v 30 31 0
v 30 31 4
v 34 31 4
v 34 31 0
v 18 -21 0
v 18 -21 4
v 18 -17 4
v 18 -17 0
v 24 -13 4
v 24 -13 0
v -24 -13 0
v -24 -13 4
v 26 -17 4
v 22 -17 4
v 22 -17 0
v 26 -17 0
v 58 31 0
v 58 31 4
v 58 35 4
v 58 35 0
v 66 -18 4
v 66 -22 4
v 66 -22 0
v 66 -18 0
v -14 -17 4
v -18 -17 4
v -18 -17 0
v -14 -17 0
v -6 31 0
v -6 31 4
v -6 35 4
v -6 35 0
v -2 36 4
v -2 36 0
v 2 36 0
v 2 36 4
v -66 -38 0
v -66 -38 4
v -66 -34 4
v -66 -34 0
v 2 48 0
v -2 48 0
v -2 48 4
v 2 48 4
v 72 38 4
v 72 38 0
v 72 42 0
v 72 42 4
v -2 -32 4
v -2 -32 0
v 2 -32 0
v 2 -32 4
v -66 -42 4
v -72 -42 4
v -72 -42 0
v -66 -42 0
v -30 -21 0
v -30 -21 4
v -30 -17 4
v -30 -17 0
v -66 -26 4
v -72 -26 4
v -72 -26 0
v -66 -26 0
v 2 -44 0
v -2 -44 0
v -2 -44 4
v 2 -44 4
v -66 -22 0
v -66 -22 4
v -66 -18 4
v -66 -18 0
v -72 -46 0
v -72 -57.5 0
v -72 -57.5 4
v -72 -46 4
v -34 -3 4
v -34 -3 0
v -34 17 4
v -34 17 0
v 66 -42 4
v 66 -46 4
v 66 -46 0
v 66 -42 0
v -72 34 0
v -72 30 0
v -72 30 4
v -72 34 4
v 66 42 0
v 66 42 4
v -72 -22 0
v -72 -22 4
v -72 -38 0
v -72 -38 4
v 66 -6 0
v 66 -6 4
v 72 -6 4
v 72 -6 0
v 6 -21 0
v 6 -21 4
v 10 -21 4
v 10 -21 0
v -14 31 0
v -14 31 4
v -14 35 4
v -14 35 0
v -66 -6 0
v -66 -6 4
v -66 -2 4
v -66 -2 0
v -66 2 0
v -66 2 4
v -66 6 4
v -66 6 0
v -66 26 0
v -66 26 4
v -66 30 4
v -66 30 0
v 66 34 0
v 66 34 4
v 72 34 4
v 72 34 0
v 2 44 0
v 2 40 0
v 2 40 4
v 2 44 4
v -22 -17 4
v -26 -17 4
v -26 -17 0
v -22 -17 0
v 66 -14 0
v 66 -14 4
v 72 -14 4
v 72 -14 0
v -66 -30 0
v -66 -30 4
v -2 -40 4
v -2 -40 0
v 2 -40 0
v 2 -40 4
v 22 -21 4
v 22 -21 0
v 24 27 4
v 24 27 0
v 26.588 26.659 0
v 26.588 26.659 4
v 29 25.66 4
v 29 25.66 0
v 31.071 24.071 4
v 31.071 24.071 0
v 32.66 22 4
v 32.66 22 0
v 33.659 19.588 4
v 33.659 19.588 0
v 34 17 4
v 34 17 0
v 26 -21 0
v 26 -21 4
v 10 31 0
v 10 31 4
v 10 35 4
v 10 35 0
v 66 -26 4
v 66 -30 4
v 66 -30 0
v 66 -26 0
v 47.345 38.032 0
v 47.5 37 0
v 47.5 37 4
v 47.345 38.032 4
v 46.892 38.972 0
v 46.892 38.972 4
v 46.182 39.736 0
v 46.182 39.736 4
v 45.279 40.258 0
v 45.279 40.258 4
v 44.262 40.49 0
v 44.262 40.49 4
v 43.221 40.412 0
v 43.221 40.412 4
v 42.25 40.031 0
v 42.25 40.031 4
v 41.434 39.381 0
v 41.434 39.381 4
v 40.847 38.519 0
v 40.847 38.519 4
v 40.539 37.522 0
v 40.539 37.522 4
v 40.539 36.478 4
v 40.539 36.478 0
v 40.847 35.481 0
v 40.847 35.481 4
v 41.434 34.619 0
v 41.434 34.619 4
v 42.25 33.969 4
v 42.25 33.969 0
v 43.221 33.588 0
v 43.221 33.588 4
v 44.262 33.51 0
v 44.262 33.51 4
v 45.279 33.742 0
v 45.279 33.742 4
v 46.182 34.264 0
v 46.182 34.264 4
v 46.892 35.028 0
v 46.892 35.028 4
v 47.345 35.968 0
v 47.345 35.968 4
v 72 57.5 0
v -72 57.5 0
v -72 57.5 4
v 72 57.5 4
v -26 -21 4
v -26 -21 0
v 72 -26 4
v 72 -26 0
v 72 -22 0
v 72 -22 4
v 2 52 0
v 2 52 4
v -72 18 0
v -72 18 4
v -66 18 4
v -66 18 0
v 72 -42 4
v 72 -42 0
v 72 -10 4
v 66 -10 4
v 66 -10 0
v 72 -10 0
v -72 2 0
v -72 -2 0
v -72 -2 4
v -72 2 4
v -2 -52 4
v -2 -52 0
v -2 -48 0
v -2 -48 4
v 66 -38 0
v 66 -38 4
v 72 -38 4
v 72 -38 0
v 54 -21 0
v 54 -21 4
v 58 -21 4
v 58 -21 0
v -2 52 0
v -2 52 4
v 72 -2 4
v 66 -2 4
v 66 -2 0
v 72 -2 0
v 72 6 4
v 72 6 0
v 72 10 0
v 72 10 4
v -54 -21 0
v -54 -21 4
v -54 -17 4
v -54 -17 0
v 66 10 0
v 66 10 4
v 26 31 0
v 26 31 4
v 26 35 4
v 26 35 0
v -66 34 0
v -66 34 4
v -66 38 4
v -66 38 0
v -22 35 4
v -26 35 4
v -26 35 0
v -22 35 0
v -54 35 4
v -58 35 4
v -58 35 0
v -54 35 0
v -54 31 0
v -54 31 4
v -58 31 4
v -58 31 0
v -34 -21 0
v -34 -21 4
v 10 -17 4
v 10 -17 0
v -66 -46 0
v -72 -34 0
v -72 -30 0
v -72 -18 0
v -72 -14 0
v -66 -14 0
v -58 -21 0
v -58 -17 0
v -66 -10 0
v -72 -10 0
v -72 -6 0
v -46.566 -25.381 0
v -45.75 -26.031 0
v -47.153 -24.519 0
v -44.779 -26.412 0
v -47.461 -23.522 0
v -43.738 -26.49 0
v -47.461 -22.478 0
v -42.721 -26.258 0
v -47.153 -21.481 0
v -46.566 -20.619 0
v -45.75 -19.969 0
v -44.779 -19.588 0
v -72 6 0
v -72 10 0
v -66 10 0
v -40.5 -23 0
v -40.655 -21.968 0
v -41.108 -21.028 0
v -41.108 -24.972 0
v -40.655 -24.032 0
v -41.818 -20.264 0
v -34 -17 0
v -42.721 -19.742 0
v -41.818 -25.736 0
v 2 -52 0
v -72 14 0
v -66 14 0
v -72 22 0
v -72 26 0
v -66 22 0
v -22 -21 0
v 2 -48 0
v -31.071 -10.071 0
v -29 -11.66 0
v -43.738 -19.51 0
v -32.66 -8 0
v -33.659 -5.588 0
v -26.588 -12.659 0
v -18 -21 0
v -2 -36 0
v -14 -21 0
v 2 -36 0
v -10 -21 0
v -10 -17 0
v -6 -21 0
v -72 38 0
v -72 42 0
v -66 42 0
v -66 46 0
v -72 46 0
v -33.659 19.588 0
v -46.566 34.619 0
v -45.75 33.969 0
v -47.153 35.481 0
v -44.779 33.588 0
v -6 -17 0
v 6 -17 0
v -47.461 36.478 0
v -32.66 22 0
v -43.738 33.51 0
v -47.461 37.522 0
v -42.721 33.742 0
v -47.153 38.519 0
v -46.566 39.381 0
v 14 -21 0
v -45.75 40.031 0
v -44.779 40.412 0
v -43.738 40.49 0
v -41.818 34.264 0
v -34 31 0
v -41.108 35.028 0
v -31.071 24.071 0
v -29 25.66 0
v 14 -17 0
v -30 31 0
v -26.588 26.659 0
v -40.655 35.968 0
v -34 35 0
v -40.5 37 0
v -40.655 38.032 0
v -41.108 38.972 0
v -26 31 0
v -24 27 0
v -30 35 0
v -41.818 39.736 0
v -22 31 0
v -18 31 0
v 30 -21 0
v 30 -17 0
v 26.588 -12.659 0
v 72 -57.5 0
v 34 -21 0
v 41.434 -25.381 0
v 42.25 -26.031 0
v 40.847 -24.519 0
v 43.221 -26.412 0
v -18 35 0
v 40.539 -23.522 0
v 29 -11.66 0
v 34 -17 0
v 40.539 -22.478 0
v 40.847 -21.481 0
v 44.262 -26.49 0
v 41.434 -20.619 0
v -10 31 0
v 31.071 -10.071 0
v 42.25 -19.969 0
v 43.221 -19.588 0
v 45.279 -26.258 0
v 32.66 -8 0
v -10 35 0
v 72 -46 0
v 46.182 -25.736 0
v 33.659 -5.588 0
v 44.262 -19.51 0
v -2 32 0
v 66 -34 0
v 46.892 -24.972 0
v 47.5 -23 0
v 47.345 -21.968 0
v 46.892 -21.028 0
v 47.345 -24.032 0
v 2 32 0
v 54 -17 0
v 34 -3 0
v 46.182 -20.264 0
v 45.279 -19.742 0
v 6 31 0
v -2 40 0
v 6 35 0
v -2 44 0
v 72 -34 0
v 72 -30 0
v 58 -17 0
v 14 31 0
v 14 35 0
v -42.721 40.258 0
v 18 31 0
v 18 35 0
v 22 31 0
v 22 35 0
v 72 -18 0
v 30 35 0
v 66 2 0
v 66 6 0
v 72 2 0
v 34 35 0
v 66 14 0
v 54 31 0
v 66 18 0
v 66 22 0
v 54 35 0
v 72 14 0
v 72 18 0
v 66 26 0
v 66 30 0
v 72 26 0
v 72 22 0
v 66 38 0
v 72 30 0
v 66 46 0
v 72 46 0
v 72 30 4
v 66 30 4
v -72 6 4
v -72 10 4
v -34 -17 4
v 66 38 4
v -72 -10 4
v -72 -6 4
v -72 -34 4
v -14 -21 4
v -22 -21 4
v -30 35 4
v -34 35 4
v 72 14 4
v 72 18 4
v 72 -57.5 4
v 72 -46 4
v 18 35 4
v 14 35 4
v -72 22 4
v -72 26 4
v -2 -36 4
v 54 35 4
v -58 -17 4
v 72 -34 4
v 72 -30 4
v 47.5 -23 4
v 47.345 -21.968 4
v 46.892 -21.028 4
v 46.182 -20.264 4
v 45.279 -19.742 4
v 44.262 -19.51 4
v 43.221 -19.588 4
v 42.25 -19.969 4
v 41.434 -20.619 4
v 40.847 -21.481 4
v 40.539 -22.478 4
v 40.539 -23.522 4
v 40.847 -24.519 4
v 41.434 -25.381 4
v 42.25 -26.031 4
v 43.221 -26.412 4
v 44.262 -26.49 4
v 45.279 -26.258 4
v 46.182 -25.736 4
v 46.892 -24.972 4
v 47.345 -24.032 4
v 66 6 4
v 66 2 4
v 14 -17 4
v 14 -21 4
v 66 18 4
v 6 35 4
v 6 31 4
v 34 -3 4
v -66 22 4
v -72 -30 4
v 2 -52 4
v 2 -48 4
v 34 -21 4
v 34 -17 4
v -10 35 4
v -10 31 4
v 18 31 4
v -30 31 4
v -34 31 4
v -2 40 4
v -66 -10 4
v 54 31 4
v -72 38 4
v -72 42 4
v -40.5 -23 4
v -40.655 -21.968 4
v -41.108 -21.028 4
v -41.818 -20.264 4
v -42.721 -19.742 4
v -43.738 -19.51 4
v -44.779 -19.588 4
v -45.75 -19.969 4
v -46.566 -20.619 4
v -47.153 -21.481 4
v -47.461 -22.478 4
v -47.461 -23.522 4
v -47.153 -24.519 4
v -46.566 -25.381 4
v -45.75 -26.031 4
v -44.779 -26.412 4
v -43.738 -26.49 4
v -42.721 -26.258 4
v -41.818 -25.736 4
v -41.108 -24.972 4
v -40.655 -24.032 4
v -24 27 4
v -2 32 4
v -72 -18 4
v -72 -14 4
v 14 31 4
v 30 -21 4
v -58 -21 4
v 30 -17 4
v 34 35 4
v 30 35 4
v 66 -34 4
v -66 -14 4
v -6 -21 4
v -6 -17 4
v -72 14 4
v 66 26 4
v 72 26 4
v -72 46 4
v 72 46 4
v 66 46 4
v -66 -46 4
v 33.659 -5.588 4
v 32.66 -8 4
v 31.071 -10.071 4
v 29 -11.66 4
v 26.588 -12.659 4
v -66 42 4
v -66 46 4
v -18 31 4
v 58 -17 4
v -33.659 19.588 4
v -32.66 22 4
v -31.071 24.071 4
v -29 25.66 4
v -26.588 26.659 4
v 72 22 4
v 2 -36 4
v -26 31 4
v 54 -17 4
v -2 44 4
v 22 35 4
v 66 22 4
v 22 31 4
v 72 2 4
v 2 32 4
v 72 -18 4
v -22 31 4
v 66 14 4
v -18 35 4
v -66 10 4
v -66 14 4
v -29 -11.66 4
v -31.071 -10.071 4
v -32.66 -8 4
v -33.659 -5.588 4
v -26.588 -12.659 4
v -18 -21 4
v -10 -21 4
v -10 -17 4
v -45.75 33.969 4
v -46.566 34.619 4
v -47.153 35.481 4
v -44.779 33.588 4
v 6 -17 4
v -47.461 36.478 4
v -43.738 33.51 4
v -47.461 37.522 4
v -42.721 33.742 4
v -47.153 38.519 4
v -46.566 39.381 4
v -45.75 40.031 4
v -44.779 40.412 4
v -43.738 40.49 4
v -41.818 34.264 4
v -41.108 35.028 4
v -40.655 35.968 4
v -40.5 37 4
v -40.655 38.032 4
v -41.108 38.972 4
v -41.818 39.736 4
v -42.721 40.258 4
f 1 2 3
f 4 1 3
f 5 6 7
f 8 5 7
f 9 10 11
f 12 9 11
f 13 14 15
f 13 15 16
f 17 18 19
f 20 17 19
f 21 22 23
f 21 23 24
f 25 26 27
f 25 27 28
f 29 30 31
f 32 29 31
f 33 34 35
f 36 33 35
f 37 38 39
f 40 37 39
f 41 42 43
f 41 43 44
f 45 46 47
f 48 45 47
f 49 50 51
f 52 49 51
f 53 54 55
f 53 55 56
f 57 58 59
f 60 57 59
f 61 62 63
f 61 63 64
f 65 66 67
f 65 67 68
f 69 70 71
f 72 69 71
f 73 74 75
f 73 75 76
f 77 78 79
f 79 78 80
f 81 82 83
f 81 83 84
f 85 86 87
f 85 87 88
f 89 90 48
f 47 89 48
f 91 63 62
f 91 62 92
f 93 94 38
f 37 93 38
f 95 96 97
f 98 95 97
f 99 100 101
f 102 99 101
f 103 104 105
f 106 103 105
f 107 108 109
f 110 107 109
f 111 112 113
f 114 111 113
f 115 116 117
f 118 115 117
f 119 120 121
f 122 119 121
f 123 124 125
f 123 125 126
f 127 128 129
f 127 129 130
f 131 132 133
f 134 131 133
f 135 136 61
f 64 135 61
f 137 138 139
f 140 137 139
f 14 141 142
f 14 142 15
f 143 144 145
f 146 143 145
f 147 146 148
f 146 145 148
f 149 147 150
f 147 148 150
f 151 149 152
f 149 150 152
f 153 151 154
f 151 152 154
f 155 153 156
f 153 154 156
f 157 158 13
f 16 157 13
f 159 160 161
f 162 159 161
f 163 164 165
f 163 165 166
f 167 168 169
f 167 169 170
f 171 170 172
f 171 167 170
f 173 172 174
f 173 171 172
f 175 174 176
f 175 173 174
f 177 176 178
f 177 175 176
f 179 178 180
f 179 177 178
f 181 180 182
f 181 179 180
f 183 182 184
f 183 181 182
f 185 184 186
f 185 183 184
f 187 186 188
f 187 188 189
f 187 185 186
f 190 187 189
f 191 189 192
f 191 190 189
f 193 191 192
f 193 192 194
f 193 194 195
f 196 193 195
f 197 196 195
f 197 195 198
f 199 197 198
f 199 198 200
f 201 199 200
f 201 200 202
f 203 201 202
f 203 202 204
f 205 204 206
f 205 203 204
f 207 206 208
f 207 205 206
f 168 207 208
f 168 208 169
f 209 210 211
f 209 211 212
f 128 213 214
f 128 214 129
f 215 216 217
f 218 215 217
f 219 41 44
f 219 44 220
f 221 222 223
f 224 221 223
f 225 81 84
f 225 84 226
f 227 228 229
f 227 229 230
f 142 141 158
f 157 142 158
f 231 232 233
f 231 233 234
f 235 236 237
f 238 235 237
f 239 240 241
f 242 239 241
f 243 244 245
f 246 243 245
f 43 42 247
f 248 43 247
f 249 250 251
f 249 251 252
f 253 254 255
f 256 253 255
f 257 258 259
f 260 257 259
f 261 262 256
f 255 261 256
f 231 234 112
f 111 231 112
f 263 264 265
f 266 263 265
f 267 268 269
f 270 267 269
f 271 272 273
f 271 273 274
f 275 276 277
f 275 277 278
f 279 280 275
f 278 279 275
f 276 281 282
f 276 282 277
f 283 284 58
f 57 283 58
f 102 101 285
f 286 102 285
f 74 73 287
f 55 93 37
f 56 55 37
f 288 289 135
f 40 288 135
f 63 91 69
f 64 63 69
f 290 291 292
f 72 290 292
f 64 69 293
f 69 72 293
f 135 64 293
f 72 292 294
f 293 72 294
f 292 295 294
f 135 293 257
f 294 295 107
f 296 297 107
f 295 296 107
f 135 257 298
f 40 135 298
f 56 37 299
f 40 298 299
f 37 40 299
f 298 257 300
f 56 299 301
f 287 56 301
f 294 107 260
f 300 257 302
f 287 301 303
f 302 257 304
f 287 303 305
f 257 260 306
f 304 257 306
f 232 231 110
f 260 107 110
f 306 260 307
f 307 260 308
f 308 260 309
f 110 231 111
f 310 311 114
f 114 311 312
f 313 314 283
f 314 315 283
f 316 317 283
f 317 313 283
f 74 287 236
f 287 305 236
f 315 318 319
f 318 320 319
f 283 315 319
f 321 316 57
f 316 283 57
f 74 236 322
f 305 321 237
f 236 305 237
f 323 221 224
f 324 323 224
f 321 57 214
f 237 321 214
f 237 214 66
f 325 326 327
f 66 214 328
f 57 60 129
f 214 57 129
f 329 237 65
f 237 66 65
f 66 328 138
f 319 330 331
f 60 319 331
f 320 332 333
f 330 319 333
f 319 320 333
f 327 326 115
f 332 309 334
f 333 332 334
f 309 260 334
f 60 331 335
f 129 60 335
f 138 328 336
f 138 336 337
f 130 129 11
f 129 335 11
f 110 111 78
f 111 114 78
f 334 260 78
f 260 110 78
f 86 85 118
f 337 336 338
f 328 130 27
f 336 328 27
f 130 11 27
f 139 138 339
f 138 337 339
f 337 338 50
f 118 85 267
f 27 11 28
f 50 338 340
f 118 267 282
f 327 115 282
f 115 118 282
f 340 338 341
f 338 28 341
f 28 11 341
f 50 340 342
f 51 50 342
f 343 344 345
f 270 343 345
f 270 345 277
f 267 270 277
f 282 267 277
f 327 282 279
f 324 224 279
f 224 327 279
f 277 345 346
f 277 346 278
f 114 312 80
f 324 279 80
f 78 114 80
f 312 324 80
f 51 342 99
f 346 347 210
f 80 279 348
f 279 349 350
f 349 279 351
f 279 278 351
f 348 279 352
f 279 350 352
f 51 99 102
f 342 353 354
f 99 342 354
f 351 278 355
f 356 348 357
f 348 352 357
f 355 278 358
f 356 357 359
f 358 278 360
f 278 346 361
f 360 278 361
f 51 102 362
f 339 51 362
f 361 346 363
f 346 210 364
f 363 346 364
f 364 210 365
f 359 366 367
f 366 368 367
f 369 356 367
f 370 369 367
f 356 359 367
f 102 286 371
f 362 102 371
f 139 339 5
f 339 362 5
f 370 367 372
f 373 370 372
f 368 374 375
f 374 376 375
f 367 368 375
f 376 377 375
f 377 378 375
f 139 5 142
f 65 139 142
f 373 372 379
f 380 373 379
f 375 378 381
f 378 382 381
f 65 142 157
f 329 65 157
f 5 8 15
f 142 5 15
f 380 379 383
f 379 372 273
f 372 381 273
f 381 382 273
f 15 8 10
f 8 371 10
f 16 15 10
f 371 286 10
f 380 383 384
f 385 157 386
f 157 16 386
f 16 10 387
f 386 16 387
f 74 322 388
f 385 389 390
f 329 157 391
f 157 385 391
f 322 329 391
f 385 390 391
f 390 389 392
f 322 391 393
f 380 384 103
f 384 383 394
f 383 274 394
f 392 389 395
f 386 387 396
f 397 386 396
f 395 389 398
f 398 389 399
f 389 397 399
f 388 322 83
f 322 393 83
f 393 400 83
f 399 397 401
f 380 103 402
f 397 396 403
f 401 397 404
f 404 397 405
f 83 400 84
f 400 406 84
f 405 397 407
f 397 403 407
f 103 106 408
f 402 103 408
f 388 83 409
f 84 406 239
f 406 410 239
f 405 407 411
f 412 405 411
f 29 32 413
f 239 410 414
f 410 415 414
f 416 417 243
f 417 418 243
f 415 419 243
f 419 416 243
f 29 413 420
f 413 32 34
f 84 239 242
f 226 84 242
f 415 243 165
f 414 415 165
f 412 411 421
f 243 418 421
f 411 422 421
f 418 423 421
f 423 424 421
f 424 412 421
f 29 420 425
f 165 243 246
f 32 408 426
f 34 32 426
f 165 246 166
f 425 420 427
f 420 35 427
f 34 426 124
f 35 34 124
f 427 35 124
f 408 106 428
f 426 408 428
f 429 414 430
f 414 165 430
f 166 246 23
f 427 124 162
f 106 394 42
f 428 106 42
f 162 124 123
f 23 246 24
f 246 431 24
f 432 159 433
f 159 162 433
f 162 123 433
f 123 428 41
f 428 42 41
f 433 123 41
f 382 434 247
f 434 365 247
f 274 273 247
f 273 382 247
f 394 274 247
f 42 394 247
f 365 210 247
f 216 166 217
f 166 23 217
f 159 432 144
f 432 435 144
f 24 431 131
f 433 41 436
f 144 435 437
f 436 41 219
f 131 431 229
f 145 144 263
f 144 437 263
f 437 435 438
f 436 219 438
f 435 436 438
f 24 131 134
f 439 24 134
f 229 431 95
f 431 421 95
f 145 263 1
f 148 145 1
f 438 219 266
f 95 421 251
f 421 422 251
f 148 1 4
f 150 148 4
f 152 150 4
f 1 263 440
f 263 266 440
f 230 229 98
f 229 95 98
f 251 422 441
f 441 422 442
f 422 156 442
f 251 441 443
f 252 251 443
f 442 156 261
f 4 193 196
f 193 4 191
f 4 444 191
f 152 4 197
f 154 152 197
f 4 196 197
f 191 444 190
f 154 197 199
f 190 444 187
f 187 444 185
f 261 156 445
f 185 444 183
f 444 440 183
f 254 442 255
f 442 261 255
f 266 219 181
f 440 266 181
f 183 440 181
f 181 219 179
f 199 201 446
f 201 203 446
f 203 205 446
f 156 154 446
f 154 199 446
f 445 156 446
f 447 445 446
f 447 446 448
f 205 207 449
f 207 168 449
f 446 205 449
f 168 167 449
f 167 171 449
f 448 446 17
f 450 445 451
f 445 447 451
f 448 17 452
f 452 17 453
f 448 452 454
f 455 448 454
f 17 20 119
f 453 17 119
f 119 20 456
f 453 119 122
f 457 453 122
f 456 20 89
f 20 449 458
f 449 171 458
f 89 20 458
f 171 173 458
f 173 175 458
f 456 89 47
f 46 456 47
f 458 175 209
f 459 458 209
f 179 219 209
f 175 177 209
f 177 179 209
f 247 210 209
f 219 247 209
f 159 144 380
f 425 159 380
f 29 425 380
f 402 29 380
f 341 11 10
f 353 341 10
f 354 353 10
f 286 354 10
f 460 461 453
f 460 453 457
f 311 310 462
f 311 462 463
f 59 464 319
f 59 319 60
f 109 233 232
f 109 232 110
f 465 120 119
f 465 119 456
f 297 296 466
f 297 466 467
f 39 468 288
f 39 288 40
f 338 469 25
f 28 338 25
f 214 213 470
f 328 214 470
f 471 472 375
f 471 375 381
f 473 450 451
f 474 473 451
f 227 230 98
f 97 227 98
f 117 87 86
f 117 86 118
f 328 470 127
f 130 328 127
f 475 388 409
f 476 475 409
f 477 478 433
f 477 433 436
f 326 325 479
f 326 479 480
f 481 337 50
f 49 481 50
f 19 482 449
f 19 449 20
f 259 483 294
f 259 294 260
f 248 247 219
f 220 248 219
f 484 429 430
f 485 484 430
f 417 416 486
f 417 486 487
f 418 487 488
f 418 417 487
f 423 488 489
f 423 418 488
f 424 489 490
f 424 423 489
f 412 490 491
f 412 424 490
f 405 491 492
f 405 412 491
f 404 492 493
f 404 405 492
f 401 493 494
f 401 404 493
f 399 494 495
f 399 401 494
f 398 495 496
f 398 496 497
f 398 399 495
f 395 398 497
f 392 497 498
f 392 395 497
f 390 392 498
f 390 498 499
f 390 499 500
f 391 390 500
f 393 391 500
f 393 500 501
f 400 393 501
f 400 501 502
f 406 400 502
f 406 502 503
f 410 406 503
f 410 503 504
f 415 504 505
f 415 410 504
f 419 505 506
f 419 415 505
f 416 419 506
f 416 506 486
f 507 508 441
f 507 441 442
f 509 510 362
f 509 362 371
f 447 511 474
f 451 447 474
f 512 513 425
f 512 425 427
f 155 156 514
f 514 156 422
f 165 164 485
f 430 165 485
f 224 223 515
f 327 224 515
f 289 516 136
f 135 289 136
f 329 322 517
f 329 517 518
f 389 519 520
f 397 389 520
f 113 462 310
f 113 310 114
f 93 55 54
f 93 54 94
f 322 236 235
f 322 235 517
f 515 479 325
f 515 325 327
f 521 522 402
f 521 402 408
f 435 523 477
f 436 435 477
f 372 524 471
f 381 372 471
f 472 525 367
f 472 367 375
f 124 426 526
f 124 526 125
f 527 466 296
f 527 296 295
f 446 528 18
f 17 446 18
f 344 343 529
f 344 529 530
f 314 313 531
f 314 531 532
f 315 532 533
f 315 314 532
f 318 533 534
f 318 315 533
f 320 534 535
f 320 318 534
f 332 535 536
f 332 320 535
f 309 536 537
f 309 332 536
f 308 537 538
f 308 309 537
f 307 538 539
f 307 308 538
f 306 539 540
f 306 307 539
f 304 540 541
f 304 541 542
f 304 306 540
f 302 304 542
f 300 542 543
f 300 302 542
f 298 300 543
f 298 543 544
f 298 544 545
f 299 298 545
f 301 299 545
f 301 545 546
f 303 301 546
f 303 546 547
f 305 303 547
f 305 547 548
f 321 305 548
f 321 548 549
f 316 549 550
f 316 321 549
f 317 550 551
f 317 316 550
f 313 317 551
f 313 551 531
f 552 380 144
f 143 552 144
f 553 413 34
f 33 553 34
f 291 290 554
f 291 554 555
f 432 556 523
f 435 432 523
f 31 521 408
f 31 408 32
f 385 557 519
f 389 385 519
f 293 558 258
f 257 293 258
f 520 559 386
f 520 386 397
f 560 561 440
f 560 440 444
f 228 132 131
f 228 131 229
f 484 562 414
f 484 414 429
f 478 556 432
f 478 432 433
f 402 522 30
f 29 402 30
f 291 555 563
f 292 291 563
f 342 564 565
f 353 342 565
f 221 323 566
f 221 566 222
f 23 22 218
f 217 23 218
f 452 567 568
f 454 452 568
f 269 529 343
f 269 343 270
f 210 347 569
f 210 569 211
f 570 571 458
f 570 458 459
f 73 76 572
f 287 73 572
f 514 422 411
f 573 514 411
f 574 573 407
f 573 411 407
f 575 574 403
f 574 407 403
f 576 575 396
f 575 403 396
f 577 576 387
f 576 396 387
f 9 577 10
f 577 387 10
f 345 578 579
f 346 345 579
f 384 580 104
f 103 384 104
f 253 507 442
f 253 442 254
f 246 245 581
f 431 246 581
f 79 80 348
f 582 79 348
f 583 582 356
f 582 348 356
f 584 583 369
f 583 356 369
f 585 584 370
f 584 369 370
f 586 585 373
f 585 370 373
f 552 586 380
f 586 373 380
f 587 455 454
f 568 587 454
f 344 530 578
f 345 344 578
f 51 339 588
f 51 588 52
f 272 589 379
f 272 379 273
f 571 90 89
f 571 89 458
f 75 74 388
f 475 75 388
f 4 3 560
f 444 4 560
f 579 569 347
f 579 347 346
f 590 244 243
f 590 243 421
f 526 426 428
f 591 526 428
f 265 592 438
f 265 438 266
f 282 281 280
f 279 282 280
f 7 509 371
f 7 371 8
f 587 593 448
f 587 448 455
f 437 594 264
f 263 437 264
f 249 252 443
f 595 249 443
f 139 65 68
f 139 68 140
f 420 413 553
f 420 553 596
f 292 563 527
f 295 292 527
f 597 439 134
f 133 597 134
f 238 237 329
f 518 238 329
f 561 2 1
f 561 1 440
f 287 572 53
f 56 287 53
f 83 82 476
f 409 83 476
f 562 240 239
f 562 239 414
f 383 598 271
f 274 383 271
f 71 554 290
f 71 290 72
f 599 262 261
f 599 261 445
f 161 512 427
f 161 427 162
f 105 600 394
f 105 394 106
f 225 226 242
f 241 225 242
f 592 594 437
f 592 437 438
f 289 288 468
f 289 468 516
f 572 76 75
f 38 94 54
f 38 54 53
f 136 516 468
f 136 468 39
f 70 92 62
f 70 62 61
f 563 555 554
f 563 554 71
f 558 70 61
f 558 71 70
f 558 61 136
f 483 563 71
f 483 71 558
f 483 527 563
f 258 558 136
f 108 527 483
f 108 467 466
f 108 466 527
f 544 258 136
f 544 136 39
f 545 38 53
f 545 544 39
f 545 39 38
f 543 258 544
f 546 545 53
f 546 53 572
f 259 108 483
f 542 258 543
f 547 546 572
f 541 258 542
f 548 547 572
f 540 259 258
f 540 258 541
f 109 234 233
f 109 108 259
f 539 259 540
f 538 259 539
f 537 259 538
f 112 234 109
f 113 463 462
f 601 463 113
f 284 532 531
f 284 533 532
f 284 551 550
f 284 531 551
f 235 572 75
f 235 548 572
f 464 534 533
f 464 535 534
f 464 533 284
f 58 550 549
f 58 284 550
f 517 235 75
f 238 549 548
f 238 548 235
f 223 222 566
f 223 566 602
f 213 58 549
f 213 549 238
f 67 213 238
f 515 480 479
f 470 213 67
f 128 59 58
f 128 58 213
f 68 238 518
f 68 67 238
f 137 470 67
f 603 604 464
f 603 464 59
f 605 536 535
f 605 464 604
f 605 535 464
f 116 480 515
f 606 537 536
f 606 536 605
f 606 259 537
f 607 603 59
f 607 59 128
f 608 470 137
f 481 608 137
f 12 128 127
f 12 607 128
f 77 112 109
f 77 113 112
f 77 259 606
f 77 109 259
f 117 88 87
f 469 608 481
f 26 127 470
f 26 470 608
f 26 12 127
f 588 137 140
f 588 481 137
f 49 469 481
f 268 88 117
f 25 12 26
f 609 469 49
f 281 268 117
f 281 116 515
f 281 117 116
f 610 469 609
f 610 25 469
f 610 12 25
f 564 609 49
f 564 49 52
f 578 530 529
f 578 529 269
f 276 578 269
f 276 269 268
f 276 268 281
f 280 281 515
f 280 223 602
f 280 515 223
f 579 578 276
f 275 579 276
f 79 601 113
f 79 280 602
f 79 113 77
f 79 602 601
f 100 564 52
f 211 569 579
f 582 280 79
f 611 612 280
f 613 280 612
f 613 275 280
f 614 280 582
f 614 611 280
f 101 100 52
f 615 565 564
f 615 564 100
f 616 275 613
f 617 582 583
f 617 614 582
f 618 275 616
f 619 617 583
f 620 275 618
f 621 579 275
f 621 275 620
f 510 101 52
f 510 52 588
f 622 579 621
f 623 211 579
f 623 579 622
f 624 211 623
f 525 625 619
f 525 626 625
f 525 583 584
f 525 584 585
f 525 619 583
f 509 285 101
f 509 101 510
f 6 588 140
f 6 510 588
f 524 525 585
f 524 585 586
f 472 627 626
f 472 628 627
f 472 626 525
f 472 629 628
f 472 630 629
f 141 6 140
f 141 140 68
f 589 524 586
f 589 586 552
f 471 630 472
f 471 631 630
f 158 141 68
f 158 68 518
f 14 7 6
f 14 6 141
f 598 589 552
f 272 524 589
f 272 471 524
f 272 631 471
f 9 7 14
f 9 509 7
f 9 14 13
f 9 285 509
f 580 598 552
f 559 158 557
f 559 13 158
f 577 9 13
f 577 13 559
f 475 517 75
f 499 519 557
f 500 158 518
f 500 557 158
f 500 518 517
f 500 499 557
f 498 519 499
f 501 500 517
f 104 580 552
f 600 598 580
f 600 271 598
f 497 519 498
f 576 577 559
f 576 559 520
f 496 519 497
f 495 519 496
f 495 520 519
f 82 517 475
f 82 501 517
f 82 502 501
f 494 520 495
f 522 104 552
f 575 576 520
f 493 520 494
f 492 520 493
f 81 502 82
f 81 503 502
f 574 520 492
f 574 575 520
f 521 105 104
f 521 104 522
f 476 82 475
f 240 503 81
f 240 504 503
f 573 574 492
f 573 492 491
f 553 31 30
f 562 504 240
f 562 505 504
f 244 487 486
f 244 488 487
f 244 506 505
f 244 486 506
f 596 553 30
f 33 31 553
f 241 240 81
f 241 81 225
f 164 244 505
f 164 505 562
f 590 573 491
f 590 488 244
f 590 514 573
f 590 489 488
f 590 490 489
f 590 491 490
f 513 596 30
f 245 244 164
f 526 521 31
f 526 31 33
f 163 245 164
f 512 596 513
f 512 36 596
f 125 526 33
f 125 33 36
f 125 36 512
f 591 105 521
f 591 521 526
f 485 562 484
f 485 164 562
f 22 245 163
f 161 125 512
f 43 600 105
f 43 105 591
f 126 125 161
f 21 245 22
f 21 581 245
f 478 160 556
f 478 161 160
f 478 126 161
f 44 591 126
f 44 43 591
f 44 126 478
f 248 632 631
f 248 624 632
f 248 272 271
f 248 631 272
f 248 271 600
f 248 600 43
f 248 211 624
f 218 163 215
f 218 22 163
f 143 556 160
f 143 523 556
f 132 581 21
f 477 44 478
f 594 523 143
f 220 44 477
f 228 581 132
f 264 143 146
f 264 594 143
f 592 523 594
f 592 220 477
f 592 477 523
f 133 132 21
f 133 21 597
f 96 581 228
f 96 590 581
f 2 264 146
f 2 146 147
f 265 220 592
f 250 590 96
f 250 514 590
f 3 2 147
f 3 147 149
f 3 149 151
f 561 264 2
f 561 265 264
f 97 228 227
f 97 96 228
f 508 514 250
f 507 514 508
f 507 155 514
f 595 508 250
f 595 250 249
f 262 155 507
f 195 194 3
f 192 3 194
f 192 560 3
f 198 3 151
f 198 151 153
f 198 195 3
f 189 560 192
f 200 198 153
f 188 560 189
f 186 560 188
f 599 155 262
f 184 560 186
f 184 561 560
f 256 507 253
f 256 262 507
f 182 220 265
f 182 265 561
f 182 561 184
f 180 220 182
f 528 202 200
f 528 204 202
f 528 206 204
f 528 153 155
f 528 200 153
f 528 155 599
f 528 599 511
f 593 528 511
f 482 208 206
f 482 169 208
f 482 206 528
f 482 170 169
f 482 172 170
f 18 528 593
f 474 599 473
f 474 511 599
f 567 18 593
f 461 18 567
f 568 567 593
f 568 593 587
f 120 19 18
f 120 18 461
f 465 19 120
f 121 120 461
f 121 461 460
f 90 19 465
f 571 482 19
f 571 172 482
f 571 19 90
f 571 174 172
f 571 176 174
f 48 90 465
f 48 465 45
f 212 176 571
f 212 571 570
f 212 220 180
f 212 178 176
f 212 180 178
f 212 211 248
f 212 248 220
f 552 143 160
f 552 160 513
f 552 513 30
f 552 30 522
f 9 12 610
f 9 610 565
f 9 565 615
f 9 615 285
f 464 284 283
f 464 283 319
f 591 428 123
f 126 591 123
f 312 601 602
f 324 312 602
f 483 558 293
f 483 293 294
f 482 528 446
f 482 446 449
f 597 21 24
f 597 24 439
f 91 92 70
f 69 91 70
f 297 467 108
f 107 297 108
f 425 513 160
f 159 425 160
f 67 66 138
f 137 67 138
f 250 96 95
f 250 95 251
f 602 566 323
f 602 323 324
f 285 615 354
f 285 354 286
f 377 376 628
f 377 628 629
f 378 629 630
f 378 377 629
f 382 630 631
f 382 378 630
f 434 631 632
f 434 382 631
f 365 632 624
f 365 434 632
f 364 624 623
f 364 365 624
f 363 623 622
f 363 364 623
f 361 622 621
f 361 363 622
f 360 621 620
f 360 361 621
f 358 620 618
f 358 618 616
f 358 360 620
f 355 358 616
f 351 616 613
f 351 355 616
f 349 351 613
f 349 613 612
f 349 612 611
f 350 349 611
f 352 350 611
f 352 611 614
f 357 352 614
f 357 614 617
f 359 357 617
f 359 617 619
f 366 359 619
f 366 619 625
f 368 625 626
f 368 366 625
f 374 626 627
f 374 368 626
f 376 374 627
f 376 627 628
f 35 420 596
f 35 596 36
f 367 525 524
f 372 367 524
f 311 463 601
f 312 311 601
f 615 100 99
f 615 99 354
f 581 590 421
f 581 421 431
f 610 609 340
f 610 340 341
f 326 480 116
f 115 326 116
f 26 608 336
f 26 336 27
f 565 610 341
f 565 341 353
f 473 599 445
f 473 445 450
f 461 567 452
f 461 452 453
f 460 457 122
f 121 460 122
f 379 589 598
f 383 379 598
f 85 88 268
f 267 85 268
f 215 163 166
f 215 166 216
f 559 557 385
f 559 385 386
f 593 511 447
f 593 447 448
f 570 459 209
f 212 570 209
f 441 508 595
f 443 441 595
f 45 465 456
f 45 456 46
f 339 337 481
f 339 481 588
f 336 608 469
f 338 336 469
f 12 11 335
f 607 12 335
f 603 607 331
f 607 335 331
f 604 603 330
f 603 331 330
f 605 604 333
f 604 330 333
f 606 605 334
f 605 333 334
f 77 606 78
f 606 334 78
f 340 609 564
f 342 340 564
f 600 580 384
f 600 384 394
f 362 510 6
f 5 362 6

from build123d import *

# Parameters (mm, degrees)
SKETCH1_W           = 144
SKETCH1_H           = 115
SKETCH1_R           = 3.5
SKETCH1_W_2         = 4
SKETCH1_H_2         = 4
BOSS_EXTRUDE1_DEPTH = 4
SKETCH2_W           = 6
SKETCH2_H           = 4
CUT_EXTRUDE1_DEPTH  = 4
SKETCH4_W           = 4
SKETCH4_H           = 4
CUT_EXTRUDE2_DEPTH  = 10


with BuildPart() as part:
    # Sketch1 → Boss-Extrude1 (new body)
    with BuildSketch(Plane.XY):
        Rectangle(SKETCH1_W, SKETCH1_H)
        with Locations((-44, 37)):
            Circle(SKETCH1_R, mode=Mode.SUBTRACT)
        with Locations((44, 37)):
            Circle(SKETCH1_R, mode=Mode.SUBTRACT)
        with Locations((44, -23)):
            Circle(SKETCH1_R, mode=Mode.SUBTRACT)
        with Locations((-44, -23)):
            Circle(SKETCH1_R, mode=Mode.SUBTRACT)
        with Locations((0, 42)):
            Rectangle(SKETCH1_W_2, SKETCH1_H_2, mode=Mode.SUBTRACT)
        with BuildLine():
            Line((-24, 27), (24, 27))
            ThreePointArc((24, 27), (31.071067812, 24.071067812), (34, 17))
            Line((34, 17), (34, -3))
            ThreePointArc((34, -3), (31.071067812, -10.071067812), (24, -13))
            Line((24, -13), (-24, -13))
            ThreePointArc((-24, -13), (-31.071067812, -10.071067812), (-34, -3))
            Line((-34, -3), (-34, 17))
            ThreePointArc((-34, 17), (-31.071067812, 24.071067812), (-24, 27))
        make_face(mode=Mode.SUBTRACT)
        with Locations((0, 50)):
            Rectangle(SKETCH1_W_2, SKETCH1_H_2, mode=Mode.SUBTRACT)
        with Locations((0, 34)):
            Rectangle(SKETCH1_W_2, SKETCH1_H_2, mode=Mode.SUBTRACT)
        with Locations((0, -34)):
            Rectangle(SKETCH1_W_2, SKETCH1_H_2, mode=Mode.SUBTRACT)
        with Locations((0, -42)):
            Rectangle(SKETCH1_W_2, SKETCH1_H_2, mode=Mode.SUBTRACT)
        with Locations((0, -50)):
            Rectangle(SKETCH1_W_2, SKETCH1_H_2, mode=Mode.SUBTRACT)
    extrude(amount=BOSS_EXTRUDE1_DEPTH)

    # Sketch2 → Cut-Extrude1 (cut)
    with BuildSketch(Plane.XY.offset(4)):
        with Locations((-69, 12)):
            Rectangle(SKETCH2_W, SKETCH2_H)
        with Locations((-69, 4)):
            Rectangle(SKETCH2_W, SKETCH2_H)
        with Locations((-69, 20)):
            Rectangle(SKETCH2_W, SKETCH2_H)
        with Locations((-69, 28)):
            Rectangle(SKETCH2_W, SKETCH2_H)
        with Locations((-69, 36)):
            Rectangle(SKETCH2_W, SKETCH2_H)
        with Locations((-69, 44)):
            Rectangle(SKETCH2_W, SKETCH2_H)
        with Locations((69, 44)):
            Rectangle(SKETCH2_W, SKETCH2_H)
        with Locations((69, 36)):
            Rectangle(SKETCH2_W, SKETCH2_H)
        with Locations((69, 28)):
            Rectangle(SKETCH2_W, SKETCH2_H)
        with Locations((69, 20)):
            Rectangle(SKETCH2_W, SKETCH2_H)
        with Locations((69, 4)):
            Rectangle(SKETCH2_W, SKETCH2_H)
        with Locations((69, 12)):
            Rectangle(SKETCH2_W, SKETCH2_H)
        with Locations((69, -12)):
            Rectangle(SKETCH2_W, SKETCH2_H)
        with Locations((69, -4)):
            Rectangle(SKETCH2_W, SKETCH2_H)
        with Locations((69, -20)):
            Rectangle(SKETCH2_W, SKETCH2_H)
        with Locations((69, -28)):
            Rectangle(SKETCH2_W, SKETCH2_H)
        with Locations((69, -36)):
            Rectangle(SKETCH2_W, SKETCH2_H)
        with Locations((69, -44)):
            Rectangle(SKETCH2_W, SKETCH2_H)
        with Locations((-69, -44)):
            Rectangle(SKETCH2_W, SKETCH2_H)
        with Locations((-69, -36)):
            Rectangle(SKETCH2_W, SKETCH2_H)
        with Locations((-69, -28)):
            Rectangle(SKETCH2_W, SKETCH2_H)
        with Locations((-69, -20)):
            Rectangle(SKETCH2_W, SKETCH2_H)
        with Locations((-69, -4)):
            Rectangle(SKETCH2_W, SKETCH2_H)
        with Locations((-69, -12)):
            Rectangle(SKETCH2_W, SKETCH2_H)
    extrude(amount=-CUT_EXTRUDE1_DEPTH, mode=Mode.SUBTRACT)

    # Sketch4 → Cut-Extrude2 (cut)
    with BuildSketch(Plane.XY.offset(4)):
        with Locations((8, -19)):
            Rectangle(SKETCH4_W, SKETCH4_H)
        with Locations((16, -19)):
            Rectangle(SKETCH4_W, SKETCH4_H)
        with Locations((24, -19)):
            Rectangle(SKETCH4_W, SKETCH4_H)
        with Locations((32, -19)):
            Rectangle(SKETCH4_W, SKETCH4_H)
        with Locations((56, -19)):
            Rectangle(SKETCH4_W, SKETCH4_H)
        with Locations((-56, -19)):
            Rectangle(SKETCH4_W, SKETCH4_H)
        with Locations((-32, -19)):
            Rectangle(SKETCH4_W, SKETCH4_H)
        with Locations((-24, -19)):
            Rectangle(SKETCH4_W, SKETCH4_H)
        with Locations((-16, -19)):
            Rectangle(SKETCH4_W, SKETCH4_H)
        with Locations((-8, -19)):
            Rectangle(SKETCH4_W, SKETCH4_H)
        with Locations((8, 33)):
            Rectangle(SKETCH4_W, SKETCH4_H)
        with Locations((16, 33)):
            Rectangle(SKETCH4_W, SKETCH4_H)
        with Locations((24, 33)):
            Rectangle(SKETCH4_W, SKETCH4_H)
        with Locations((32, 33)):
            Rectangle(SKETCH4_W, SKETCH4_H)
        with Locations((-56, 33)):
            Rectangle(SKETCH4_W, SKETCH4_H)
        with Locations((-32, 33)):
            Rectangle(SKETCH4_W, SKETCH4_H)
        with Locations((56, 33)):
            Rectangle(SKETCH4_W, SKETCH4_H)
        with Locations((-24, 33)):
            Rectangle(SKETCH4_W, SKETCH4_H)
        with Locations((-16, 33)):
            Rectangle(SKETCH4_W, SKETCH4_H)
        with Locations((-8, 33)):
            Rectangle(SKETCH4_W, SKETCH4_H)
    extrude(amount=-CUT_EXTRUDE2_DEPTH, mode=Mode.SUBTRACT)


solid = part.part
